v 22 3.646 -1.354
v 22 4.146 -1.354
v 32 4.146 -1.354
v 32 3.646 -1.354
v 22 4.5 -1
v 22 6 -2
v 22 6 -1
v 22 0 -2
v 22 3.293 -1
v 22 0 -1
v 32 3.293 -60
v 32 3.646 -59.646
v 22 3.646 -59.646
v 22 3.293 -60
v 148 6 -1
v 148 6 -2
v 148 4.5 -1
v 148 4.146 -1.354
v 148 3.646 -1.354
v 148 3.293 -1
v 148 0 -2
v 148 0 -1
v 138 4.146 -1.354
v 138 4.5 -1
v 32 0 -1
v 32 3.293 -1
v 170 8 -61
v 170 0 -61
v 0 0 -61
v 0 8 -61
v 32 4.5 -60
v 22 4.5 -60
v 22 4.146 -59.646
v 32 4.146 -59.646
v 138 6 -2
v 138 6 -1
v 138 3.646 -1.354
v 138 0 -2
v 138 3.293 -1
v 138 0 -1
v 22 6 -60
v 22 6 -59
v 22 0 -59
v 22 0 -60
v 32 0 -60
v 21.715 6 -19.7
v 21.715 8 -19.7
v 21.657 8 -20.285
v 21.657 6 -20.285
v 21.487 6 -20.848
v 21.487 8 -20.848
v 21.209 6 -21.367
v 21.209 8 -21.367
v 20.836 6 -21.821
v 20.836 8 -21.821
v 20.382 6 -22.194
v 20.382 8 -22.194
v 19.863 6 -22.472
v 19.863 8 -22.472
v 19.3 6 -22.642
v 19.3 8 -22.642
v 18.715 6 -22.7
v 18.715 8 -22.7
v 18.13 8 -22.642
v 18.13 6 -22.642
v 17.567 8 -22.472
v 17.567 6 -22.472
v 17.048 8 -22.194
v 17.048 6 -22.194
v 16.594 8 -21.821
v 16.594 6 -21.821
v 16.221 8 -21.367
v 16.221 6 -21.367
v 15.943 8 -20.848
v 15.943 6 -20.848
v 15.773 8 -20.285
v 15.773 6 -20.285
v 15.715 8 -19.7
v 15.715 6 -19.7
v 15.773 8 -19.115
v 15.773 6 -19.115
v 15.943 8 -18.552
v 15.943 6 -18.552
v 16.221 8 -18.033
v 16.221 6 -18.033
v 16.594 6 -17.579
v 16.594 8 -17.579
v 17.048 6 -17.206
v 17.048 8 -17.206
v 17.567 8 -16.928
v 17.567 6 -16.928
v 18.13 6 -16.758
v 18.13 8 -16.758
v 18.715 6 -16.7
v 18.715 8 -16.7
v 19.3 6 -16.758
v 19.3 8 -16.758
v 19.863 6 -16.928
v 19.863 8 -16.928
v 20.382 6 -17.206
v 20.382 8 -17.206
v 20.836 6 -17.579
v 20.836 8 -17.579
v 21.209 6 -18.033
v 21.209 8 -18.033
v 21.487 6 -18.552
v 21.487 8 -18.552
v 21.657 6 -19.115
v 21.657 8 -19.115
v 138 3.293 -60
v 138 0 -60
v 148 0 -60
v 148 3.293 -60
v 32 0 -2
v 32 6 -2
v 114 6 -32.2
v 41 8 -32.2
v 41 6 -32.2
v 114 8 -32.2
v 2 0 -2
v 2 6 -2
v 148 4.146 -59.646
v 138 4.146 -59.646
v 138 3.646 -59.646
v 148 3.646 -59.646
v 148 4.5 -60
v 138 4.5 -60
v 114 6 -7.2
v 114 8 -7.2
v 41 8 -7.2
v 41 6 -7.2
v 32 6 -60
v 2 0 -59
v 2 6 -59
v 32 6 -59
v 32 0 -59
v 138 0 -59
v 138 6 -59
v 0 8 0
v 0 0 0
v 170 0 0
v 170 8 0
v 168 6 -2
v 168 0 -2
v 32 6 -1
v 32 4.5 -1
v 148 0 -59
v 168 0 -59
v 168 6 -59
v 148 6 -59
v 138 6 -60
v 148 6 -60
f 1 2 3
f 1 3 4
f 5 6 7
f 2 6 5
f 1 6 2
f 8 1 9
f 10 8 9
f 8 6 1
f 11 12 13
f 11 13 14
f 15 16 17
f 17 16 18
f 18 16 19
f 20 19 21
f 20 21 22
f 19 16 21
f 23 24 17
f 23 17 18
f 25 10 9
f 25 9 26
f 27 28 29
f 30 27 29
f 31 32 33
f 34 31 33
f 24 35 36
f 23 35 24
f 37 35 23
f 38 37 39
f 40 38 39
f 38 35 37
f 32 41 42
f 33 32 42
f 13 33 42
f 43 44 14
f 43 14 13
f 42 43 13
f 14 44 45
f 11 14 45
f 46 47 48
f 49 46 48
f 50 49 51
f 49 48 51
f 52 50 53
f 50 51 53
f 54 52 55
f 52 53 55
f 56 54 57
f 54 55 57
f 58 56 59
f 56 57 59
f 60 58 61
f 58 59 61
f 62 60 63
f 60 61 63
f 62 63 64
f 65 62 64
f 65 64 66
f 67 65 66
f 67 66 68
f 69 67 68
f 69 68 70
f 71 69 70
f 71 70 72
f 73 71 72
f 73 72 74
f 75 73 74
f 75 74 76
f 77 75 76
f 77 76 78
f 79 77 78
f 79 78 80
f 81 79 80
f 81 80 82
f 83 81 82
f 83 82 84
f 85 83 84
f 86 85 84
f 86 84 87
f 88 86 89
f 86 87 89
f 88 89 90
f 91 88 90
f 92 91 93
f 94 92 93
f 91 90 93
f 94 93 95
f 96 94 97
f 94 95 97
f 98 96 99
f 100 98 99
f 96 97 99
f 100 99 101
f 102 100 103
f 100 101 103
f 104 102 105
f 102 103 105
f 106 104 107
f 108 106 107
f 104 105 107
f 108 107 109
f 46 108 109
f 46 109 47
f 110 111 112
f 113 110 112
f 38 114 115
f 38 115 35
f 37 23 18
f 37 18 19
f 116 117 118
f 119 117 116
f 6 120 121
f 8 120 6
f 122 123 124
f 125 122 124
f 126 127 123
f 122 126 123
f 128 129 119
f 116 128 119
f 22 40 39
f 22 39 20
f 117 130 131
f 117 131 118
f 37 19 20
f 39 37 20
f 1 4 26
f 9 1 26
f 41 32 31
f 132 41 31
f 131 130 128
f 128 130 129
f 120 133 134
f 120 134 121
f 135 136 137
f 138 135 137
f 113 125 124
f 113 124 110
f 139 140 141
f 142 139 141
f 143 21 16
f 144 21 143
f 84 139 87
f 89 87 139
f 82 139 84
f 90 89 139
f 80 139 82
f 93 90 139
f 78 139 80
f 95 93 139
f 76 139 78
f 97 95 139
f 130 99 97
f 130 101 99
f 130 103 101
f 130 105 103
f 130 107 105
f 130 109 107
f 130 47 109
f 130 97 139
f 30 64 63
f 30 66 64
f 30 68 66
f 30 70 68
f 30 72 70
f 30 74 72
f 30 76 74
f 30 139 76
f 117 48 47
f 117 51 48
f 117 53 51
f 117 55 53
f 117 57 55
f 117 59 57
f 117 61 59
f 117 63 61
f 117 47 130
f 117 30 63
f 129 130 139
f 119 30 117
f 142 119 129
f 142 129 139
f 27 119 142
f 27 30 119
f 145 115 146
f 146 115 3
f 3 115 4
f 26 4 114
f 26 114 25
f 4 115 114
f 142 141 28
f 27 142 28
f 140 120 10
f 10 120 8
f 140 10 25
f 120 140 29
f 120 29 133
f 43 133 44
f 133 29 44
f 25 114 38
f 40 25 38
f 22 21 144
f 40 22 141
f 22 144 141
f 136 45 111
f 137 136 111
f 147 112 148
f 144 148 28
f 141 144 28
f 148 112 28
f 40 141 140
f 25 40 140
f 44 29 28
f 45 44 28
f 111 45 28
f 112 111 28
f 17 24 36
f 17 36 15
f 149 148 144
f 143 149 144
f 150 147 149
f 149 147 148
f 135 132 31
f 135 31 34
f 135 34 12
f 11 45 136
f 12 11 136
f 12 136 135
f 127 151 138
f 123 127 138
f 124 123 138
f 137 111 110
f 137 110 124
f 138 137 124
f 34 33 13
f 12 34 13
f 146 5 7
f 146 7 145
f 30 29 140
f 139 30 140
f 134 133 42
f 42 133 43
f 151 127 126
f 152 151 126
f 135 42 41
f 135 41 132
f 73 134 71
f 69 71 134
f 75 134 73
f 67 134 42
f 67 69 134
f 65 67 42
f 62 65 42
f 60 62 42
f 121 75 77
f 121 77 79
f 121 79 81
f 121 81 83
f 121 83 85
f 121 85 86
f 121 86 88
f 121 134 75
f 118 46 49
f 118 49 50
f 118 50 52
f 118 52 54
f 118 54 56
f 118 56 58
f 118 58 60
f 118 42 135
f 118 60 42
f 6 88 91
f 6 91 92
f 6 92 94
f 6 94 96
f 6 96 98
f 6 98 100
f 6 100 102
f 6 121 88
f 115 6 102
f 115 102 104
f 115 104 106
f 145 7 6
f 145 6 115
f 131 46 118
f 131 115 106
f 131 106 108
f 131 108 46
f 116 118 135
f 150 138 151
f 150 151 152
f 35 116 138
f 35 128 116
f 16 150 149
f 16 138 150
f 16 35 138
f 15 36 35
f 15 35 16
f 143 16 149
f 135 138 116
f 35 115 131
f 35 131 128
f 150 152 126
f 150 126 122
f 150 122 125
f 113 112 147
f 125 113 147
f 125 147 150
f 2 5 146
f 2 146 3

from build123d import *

# Parameters (mm, degrees)
BOSS_EXTRUDE1_DEPTH = 8
SKETCH9_W           = 166
SKETCH9_H           = 57
CUT_EXTRUDE5_DEPTH  = 6
SKETCH10_W          = 10
SKETCH10_H          = 1
CUT_EXTRUDE6_DEPTH  = 6
BOSS_EXTRUDE4_DEPTH = 130
SKETCH13_R          = 3
SKETCH13_W          = 73
SKETCH13_H          = 25
CUT_EXTRUDE7_DEPTH  = 130


with BuildPart() as part:
    # Sketch1 → Boss-Extrude1 (new body)
    with BuildSketch(Plane(origin=(0, 0, 0), x_dir=(1, 0, 0), z_dir=(0, 1, 0))):
        Polygon((0, 0), (88, 0), (170, 0), (170, 41), (170, 61), (0, 61), align=None)
    extrude(amount=BOSS_EXTRUDE1_DEPTH)

    # Sketch9 → Cut-Extrude5 (cut)
    with BuildSketch(Plane.XZ):
        with Locations((85, -30.5)):
            Rectangle(SKETCH9_W, SKETCH9_H)
    extrude(amount=-CUT_EXTRUDE5_DEPTH, mode=Mode.SUBTRACT)

    # Sketch10 → Cut-Extrude6 (cut)
    with BuildSketch(Plane.XZ):
        with Locations((27, -1.5)):
            Rectangle(SKETCH10_W, SKETCH10_H)
        with Locations((27, -59.5)):
            Rectangle(SKETCH10_W, SKETCH10_H)
        with Locations((143, -59.5)):
            Rectangle(SKETCH10_W, SKETCH10_H)
        with Locations((143, -1.5)):
            Rectangle(SKETCH10_W, SKETCH10_H)
    extrude(amount=-CUT_EXTRUDE6_DEPTH, mode=Mode.SUBTRACT)

    # Sketch11 → Boss-Extrude4 (add)
    with BuildSketch(Plane(origin=(22, 0, 0), x_dir=(0, 0, -1), z_dir=(1, 0, 0))):
        Polygon((1, 3.292893219), (1, 4.5), (1.353553391, 4.146446609), (1.353553391, 3.646446609), align=None)
        Polygon((60, 3.292893219), (60, 4.5), (59.646446609, 4.146446609), (59.646446609, 3.646446609), align=None)
    extrude(amount=BOSS_EXTRUDE4_DEPTH)

    # Sketch13 → Cut-Extrude7 (cut)
    with BuildSketch(Plane(origin=(0, 8, 0), x_dir=(1, 0, 0), z_dir=(0, 1, 0))):
        with Locations((18.71505207, 19.7)):
            Circle(SKETCH13_R)
        with Locations((77.5, 19.7)):
            Rectangle(SKETCH13_W, SKETCH13_H)
    extrude(amount=-CUT_EXTRUDE7_DEPTH, mode=Mode.SUBTRACT)


solid = part.part
